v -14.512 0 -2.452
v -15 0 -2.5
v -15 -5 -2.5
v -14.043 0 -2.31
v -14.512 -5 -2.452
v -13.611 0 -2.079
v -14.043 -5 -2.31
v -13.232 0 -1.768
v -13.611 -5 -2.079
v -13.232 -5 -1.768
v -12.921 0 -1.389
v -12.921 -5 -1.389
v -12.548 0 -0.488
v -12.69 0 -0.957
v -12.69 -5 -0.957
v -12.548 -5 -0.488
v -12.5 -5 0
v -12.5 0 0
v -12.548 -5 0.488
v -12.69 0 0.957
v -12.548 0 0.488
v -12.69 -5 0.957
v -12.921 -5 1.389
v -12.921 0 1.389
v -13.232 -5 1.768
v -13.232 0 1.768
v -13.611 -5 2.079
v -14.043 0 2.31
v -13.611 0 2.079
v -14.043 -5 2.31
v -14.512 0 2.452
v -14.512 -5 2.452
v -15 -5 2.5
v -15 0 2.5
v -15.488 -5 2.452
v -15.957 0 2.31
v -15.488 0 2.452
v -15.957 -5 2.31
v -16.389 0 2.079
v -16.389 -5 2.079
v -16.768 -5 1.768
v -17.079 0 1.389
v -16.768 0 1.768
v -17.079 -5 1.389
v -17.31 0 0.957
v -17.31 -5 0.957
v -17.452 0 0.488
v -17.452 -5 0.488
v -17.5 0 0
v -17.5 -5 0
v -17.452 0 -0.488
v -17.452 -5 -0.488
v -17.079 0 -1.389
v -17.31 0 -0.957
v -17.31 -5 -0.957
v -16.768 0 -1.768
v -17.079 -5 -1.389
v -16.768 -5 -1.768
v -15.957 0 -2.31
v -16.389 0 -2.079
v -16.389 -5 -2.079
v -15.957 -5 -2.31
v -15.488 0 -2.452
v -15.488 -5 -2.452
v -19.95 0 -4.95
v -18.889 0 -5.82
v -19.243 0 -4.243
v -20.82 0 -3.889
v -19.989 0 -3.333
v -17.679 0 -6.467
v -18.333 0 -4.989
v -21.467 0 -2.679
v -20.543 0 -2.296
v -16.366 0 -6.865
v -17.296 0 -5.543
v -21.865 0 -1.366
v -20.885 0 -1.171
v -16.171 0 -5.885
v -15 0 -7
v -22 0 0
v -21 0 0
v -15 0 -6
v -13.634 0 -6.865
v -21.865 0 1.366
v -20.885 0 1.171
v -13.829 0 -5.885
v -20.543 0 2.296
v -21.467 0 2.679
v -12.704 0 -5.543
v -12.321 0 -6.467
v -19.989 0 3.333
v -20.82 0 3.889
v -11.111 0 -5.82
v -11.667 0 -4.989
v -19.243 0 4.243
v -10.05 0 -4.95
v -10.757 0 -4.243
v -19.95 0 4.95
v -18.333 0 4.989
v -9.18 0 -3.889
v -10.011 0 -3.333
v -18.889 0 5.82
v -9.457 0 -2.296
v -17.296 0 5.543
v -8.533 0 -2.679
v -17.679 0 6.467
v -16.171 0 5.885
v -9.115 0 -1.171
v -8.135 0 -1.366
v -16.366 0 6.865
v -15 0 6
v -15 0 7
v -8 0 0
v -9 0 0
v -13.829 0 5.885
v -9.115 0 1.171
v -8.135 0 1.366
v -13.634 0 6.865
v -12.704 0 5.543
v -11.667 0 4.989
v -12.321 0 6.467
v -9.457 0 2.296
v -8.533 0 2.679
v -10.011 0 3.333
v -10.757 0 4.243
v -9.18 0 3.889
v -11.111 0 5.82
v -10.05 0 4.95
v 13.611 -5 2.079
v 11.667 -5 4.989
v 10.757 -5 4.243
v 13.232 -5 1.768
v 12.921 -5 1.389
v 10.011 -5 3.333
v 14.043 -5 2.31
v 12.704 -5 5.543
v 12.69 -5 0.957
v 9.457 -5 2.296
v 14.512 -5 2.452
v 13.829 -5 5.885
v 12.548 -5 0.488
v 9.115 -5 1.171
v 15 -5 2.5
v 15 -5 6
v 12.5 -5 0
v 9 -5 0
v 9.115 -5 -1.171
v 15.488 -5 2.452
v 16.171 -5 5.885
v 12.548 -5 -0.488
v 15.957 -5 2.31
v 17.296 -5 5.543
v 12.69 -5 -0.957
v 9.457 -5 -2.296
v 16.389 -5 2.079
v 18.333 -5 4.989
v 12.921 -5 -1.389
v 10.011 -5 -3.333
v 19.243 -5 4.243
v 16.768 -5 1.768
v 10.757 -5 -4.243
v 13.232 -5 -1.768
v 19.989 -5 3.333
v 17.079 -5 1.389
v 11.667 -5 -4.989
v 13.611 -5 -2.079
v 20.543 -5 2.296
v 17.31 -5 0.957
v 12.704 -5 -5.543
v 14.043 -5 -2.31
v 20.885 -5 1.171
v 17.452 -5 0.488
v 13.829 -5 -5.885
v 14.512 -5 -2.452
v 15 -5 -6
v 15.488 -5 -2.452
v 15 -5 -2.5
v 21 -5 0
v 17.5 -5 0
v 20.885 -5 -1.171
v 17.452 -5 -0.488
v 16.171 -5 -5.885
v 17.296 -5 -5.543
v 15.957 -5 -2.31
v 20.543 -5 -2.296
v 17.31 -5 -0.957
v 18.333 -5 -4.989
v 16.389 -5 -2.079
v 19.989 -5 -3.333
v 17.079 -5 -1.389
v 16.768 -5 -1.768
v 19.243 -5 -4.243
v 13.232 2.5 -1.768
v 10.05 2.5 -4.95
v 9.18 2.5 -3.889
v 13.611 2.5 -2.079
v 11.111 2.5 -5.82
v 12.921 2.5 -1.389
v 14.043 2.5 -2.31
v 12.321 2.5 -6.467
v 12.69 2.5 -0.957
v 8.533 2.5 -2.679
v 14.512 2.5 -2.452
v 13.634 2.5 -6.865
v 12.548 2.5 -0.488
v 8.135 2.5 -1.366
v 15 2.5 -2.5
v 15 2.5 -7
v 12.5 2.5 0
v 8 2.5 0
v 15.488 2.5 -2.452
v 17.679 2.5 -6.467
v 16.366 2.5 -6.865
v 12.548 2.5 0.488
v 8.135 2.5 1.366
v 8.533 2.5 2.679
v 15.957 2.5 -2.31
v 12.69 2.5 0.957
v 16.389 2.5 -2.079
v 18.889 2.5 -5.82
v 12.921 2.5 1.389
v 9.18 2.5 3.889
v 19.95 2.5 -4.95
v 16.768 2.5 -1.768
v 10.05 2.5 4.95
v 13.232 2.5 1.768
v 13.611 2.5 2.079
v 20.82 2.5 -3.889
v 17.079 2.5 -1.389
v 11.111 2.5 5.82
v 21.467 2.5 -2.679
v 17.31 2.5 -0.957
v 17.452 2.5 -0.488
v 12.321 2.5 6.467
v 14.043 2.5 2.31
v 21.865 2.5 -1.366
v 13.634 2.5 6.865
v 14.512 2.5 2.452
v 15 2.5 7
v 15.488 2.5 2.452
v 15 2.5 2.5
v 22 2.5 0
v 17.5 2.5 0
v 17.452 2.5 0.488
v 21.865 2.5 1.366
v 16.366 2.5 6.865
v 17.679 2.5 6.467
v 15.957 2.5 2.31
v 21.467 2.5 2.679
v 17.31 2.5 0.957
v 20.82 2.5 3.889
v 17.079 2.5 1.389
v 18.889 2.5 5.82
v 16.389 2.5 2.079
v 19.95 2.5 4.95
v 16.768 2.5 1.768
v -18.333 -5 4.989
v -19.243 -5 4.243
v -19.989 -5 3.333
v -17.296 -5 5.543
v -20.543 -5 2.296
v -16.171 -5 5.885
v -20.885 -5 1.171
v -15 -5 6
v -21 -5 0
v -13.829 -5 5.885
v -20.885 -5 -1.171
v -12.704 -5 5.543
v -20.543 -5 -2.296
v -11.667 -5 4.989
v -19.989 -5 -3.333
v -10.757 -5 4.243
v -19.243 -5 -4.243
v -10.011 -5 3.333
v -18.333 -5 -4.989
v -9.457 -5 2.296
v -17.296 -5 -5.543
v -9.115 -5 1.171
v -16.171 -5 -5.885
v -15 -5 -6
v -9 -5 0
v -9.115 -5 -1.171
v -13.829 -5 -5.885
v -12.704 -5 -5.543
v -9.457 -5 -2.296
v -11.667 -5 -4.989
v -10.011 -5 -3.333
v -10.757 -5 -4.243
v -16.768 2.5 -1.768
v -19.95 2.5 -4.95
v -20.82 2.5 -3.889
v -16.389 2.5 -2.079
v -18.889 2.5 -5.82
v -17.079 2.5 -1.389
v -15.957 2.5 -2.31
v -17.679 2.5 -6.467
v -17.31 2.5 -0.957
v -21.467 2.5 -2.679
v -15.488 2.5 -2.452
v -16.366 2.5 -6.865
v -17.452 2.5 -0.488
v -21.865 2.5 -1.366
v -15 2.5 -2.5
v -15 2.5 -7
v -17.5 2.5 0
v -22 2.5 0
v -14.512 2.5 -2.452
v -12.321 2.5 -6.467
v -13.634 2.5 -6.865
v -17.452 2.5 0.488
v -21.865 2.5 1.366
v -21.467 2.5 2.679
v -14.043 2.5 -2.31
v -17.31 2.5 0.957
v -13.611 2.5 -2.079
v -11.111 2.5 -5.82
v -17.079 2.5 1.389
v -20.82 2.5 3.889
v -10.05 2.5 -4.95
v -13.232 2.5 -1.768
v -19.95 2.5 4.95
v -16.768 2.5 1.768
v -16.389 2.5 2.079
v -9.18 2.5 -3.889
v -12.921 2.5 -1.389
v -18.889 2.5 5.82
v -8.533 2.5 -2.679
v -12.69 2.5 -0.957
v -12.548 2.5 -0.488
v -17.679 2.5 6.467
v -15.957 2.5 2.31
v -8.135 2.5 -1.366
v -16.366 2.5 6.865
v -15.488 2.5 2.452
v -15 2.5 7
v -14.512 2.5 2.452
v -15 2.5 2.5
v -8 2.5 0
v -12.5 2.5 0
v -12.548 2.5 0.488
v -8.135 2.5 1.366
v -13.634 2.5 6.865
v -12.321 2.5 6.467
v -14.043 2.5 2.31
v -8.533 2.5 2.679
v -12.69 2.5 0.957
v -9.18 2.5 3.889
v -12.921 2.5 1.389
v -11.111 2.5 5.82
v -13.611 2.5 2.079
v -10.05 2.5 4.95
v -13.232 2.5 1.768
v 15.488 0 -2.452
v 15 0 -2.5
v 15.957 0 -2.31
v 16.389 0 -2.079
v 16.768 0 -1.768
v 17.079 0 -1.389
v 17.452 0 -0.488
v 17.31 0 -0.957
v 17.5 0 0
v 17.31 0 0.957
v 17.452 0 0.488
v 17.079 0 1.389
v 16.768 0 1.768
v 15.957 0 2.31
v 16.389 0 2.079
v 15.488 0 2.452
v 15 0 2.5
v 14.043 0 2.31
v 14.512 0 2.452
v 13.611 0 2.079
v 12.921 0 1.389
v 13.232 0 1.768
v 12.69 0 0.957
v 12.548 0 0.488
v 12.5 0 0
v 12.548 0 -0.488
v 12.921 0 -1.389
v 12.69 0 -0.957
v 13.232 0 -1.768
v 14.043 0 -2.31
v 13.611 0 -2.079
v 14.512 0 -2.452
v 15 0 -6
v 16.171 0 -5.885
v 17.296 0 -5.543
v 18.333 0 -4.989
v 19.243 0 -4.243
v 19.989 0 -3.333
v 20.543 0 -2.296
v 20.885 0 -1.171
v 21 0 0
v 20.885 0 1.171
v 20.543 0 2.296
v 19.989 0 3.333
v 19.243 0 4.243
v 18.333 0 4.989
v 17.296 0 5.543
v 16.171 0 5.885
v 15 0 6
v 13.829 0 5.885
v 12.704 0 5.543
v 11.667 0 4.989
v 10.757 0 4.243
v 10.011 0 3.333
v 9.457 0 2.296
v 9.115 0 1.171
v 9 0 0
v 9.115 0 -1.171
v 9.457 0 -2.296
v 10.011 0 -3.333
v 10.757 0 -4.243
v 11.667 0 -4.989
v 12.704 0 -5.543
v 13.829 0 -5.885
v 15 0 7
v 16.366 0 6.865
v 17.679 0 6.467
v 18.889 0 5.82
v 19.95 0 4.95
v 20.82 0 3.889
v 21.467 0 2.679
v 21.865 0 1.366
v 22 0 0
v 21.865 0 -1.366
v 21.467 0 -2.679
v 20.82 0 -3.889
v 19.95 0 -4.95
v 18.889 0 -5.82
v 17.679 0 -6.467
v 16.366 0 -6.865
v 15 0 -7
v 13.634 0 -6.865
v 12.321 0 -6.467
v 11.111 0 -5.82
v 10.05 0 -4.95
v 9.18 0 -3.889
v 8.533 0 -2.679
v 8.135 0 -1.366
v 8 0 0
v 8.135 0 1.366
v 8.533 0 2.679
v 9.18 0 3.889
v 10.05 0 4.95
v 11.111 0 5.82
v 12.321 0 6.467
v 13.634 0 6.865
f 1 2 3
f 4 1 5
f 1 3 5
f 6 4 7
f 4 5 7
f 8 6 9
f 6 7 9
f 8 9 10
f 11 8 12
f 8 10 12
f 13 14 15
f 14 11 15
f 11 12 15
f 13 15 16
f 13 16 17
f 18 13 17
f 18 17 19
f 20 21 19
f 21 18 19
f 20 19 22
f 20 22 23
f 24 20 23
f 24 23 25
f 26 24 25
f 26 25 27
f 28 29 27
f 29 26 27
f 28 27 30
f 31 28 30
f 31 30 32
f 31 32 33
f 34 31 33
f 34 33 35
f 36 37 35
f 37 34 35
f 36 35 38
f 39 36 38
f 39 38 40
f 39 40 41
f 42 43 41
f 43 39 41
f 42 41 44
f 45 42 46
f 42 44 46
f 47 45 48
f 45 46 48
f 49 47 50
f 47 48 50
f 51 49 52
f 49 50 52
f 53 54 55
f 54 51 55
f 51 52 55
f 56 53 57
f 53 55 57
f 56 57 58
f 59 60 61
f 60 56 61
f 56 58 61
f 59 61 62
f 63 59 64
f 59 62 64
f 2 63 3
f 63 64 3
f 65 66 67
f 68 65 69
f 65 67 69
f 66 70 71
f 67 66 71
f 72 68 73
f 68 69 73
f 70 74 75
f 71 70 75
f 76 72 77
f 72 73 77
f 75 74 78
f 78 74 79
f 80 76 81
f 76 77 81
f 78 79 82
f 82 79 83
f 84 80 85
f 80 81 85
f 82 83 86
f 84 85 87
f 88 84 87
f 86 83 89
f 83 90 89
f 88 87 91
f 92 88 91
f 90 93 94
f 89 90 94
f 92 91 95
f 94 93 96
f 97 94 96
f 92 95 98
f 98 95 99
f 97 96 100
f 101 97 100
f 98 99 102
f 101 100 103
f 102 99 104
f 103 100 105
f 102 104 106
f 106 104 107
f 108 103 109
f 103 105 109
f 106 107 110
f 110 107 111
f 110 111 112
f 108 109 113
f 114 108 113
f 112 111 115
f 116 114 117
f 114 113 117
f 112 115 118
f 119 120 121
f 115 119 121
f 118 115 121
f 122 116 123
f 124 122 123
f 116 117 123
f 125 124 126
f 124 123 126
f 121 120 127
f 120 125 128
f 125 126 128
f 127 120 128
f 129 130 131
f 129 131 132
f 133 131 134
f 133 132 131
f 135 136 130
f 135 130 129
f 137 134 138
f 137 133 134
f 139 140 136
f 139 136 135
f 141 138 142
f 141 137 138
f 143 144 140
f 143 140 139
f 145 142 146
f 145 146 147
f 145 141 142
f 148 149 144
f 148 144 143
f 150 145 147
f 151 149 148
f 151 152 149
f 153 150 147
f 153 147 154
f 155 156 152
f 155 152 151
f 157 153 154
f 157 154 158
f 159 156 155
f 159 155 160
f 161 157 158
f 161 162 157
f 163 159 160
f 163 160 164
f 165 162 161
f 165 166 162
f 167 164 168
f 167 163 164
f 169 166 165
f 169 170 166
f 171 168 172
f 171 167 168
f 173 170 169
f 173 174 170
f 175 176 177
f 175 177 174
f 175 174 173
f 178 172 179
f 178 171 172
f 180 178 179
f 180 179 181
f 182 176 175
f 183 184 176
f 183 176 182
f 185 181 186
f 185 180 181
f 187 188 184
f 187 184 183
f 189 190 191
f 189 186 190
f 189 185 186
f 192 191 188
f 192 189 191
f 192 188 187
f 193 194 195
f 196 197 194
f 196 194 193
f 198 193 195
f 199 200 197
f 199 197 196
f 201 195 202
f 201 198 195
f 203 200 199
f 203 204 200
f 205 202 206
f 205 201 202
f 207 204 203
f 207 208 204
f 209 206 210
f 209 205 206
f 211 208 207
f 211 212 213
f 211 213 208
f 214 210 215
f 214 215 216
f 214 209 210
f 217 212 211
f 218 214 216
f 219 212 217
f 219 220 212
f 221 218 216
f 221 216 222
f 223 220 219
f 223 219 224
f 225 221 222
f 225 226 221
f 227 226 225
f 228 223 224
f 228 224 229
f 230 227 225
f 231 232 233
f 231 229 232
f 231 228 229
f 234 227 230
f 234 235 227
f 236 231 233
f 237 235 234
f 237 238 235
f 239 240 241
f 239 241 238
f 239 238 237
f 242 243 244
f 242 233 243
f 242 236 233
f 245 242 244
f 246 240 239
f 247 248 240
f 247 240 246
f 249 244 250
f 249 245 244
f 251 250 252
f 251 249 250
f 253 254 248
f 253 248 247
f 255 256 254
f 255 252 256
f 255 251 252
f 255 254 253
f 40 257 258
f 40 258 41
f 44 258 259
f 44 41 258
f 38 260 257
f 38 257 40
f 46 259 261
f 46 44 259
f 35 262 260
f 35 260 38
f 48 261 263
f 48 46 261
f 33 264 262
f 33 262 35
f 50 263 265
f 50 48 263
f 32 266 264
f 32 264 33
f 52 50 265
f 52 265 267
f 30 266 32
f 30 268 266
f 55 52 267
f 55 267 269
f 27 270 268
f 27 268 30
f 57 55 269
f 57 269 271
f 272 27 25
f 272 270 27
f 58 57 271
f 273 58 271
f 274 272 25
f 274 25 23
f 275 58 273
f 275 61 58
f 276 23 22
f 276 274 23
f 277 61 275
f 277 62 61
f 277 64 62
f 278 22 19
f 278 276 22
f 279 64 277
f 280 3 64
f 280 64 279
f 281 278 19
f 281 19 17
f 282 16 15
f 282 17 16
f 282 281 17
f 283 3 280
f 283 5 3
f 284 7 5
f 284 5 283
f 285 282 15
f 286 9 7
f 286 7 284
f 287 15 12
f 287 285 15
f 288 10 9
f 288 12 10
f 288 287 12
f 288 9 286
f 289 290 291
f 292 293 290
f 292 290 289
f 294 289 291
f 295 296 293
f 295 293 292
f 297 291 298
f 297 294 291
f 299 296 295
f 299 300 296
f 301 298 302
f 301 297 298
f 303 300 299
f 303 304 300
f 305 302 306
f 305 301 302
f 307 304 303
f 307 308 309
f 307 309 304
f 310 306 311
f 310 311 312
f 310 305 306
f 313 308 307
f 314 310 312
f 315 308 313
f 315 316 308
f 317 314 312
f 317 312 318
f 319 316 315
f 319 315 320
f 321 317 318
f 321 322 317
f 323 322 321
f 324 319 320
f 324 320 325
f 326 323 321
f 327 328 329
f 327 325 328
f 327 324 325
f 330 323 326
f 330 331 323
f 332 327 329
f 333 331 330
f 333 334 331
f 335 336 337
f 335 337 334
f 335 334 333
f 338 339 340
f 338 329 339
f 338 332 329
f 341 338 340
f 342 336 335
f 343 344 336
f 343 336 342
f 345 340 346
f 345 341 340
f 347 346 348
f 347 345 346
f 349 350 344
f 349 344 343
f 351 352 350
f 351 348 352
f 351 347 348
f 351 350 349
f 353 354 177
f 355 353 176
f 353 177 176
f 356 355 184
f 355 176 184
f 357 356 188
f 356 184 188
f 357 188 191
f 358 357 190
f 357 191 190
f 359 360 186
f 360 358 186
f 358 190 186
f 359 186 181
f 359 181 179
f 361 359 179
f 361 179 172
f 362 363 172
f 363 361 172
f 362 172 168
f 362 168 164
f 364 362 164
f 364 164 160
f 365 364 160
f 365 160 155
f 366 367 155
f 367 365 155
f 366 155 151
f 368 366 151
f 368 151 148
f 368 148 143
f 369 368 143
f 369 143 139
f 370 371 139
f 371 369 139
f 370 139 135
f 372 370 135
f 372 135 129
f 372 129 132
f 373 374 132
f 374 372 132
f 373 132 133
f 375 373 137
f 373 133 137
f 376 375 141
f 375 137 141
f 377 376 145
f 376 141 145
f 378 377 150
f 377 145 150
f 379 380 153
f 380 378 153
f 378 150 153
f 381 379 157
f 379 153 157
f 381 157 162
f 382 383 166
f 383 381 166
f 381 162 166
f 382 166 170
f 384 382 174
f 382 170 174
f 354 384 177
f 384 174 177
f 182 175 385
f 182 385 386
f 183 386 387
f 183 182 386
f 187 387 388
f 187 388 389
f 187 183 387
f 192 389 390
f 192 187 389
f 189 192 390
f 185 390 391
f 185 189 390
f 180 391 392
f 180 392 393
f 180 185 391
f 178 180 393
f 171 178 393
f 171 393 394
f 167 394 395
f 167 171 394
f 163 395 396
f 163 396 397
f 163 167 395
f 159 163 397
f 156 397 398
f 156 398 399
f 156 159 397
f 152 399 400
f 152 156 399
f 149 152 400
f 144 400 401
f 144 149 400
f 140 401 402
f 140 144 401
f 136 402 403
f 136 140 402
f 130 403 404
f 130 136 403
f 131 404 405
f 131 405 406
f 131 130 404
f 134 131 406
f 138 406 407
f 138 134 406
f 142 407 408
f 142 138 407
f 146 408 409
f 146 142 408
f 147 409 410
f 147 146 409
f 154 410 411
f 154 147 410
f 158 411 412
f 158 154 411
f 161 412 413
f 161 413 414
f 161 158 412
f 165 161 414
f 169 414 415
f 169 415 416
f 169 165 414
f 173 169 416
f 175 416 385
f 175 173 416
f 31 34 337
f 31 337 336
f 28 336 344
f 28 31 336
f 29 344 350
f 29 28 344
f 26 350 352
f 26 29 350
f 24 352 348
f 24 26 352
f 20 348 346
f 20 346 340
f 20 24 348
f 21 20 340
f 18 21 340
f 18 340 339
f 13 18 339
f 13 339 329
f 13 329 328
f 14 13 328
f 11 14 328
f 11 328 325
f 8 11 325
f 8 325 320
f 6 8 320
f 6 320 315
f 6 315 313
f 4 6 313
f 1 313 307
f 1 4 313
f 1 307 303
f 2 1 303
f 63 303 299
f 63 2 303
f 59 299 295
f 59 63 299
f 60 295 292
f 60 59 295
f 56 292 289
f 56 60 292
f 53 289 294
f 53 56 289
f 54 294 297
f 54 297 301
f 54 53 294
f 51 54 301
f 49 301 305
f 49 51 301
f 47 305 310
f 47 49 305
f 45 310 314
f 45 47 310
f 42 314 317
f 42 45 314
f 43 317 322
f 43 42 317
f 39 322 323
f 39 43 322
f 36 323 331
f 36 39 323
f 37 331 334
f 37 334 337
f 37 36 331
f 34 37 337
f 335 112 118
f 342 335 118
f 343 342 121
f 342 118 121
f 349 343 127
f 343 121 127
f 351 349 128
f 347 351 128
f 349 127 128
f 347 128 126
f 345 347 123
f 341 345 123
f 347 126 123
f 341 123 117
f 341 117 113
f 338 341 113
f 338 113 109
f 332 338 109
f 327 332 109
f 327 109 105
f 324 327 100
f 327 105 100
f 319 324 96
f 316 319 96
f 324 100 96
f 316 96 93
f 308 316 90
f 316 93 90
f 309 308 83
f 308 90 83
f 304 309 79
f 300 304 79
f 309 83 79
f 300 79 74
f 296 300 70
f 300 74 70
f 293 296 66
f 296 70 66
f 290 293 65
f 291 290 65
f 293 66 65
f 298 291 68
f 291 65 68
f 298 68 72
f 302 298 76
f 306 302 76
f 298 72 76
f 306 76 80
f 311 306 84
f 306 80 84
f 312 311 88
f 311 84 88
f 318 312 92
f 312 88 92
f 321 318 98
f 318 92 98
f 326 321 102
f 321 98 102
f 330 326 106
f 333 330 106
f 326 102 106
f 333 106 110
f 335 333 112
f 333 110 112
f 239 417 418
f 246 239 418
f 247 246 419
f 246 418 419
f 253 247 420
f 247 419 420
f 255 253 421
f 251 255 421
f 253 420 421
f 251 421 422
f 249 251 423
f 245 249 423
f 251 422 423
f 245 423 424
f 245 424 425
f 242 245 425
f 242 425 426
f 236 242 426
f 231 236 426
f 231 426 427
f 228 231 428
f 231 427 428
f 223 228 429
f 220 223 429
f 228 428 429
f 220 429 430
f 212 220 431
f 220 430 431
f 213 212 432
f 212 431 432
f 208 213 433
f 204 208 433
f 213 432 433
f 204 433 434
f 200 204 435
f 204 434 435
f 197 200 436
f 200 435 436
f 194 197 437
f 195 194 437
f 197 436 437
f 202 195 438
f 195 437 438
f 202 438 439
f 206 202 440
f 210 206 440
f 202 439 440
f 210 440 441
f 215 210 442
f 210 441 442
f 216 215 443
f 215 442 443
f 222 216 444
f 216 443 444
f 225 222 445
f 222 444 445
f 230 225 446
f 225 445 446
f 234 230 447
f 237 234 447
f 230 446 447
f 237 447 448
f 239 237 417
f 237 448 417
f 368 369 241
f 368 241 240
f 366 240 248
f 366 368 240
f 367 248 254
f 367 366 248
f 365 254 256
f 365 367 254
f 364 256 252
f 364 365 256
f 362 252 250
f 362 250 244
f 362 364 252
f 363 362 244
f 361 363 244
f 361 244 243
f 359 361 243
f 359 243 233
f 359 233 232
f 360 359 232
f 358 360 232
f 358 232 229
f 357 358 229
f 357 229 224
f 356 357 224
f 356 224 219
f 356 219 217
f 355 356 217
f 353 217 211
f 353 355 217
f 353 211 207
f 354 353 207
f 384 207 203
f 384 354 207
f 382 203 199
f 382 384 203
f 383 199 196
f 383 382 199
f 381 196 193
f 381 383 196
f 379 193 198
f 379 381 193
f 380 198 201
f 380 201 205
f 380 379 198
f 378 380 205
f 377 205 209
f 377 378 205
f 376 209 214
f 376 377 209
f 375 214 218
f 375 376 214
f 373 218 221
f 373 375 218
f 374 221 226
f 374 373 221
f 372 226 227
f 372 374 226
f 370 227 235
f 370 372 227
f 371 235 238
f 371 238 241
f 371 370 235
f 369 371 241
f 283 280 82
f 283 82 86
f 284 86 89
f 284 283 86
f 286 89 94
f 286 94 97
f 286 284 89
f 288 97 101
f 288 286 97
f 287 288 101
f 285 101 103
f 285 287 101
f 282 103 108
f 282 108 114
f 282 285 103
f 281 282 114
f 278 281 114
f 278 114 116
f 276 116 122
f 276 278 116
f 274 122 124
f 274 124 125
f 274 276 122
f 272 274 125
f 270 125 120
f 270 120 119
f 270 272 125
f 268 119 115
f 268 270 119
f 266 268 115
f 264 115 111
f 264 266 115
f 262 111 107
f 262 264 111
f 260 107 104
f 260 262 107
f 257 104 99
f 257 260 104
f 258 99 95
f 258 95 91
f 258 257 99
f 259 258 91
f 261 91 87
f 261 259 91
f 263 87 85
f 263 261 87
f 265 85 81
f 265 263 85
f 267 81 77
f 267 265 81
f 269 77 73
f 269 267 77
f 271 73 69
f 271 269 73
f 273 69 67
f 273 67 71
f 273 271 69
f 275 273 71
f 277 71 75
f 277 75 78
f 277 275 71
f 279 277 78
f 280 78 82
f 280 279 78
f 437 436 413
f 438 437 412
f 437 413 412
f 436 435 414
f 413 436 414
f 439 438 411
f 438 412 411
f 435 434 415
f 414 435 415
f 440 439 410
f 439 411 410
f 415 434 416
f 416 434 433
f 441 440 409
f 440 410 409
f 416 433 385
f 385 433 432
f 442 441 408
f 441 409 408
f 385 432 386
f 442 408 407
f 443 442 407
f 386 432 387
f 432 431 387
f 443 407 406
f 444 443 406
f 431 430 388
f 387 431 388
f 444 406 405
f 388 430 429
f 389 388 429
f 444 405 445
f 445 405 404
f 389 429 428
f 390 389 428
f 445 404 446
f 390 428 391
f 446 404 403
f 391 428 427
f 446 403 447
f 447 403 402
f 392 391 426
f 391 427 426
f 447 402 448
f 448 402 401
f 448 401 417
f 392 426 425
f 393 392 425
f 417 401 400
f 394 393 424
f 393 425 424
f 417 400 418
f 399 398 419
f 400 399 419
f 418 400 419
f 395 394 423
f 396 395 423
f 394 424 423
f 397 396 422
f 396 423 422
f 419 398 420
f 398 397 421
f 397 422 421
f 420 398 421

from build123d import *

# Parameters (mm, degrees)
SKETCH3_R           = 7
SKETCH3_R_2         = 2.5
BOSS_EXTRUDE2_DEPTH = 2.5
SKETCH4_R           = 7
SKETCH4_R_2         = 2.5
BOSS_EXTRUDE3_DEPTH = 2.5
BOSS_EXTRUDE4_START = 5
SKETCH5_R           = 6
SKETCH5_R_2         = 2.5
BOSS_EXTRUDE4_DEPTH = 5


with BuildPart() as part:
    # Sketch3 → Boss-Extrude2 (new body)
    with BuildSketch(Plane(origin=(0, 0, 0), x_dir=(1, 0, 0), z_dir=(0, 1, 0))):
        with Locations((-15, 0)):
            Circle(SKETCH3_R)
        with Locations((-15, 0)):
            Circle(SKETCH3_R_2, mode=Mode.SUBTRACT)
    extrude(amount=BOSS_EXTRUDE2_DEPTH)



with BuildPart() as body_2:
    # Sketch4 → Boss-Extrude3 (new body)
    with BuildSketch(Plane(origin=(0, 0, 0), x_dir=(1, 0, 0), z_dir=(0, 1, 0))):
        with Locations((15, 0)):
            Circle(SKETCH4_R)
        with Locations((15, 0)):
            Circle(SKETCH4_R_2, mode=Mode.SUBTRACT)
    extrude(amount=BOSS_EXTRUDE3_DEPTH)


with BuildPart() as part_1:
    add(part.part)

    add(body_2.part)  # Boss-Extrude4 merges body 2
    # Sketch5 → Boss-Extrude4 (add)
    # profile 1 of 2: a face of its own
    with BuildSketch(Plane.XZ.offset(BOSS_EXTRUDE4_START)):
        with Locations((15, 0)):
            Circle(SKETCH5_R)
        with Locations((15, 0)):
            Circle(SKETCH5_R_2, mode=Mode.SUBTRACT)
    # profile 2 of 2: a face of its own
    with BuildSketch(Plane.XZ.offset(BOSS_EXTRUDE4_START)):
        with Locations((-15, 0)):
            Circle(SKETCH5_R)
        with Locations((-15, 0)):
            Circle(SKETCH5_R_2, mode=Mode.SUBTRACT)
    extrude(amount=-BOSS_EXTRUDE4_DEPTH)


solid = part_1.part
